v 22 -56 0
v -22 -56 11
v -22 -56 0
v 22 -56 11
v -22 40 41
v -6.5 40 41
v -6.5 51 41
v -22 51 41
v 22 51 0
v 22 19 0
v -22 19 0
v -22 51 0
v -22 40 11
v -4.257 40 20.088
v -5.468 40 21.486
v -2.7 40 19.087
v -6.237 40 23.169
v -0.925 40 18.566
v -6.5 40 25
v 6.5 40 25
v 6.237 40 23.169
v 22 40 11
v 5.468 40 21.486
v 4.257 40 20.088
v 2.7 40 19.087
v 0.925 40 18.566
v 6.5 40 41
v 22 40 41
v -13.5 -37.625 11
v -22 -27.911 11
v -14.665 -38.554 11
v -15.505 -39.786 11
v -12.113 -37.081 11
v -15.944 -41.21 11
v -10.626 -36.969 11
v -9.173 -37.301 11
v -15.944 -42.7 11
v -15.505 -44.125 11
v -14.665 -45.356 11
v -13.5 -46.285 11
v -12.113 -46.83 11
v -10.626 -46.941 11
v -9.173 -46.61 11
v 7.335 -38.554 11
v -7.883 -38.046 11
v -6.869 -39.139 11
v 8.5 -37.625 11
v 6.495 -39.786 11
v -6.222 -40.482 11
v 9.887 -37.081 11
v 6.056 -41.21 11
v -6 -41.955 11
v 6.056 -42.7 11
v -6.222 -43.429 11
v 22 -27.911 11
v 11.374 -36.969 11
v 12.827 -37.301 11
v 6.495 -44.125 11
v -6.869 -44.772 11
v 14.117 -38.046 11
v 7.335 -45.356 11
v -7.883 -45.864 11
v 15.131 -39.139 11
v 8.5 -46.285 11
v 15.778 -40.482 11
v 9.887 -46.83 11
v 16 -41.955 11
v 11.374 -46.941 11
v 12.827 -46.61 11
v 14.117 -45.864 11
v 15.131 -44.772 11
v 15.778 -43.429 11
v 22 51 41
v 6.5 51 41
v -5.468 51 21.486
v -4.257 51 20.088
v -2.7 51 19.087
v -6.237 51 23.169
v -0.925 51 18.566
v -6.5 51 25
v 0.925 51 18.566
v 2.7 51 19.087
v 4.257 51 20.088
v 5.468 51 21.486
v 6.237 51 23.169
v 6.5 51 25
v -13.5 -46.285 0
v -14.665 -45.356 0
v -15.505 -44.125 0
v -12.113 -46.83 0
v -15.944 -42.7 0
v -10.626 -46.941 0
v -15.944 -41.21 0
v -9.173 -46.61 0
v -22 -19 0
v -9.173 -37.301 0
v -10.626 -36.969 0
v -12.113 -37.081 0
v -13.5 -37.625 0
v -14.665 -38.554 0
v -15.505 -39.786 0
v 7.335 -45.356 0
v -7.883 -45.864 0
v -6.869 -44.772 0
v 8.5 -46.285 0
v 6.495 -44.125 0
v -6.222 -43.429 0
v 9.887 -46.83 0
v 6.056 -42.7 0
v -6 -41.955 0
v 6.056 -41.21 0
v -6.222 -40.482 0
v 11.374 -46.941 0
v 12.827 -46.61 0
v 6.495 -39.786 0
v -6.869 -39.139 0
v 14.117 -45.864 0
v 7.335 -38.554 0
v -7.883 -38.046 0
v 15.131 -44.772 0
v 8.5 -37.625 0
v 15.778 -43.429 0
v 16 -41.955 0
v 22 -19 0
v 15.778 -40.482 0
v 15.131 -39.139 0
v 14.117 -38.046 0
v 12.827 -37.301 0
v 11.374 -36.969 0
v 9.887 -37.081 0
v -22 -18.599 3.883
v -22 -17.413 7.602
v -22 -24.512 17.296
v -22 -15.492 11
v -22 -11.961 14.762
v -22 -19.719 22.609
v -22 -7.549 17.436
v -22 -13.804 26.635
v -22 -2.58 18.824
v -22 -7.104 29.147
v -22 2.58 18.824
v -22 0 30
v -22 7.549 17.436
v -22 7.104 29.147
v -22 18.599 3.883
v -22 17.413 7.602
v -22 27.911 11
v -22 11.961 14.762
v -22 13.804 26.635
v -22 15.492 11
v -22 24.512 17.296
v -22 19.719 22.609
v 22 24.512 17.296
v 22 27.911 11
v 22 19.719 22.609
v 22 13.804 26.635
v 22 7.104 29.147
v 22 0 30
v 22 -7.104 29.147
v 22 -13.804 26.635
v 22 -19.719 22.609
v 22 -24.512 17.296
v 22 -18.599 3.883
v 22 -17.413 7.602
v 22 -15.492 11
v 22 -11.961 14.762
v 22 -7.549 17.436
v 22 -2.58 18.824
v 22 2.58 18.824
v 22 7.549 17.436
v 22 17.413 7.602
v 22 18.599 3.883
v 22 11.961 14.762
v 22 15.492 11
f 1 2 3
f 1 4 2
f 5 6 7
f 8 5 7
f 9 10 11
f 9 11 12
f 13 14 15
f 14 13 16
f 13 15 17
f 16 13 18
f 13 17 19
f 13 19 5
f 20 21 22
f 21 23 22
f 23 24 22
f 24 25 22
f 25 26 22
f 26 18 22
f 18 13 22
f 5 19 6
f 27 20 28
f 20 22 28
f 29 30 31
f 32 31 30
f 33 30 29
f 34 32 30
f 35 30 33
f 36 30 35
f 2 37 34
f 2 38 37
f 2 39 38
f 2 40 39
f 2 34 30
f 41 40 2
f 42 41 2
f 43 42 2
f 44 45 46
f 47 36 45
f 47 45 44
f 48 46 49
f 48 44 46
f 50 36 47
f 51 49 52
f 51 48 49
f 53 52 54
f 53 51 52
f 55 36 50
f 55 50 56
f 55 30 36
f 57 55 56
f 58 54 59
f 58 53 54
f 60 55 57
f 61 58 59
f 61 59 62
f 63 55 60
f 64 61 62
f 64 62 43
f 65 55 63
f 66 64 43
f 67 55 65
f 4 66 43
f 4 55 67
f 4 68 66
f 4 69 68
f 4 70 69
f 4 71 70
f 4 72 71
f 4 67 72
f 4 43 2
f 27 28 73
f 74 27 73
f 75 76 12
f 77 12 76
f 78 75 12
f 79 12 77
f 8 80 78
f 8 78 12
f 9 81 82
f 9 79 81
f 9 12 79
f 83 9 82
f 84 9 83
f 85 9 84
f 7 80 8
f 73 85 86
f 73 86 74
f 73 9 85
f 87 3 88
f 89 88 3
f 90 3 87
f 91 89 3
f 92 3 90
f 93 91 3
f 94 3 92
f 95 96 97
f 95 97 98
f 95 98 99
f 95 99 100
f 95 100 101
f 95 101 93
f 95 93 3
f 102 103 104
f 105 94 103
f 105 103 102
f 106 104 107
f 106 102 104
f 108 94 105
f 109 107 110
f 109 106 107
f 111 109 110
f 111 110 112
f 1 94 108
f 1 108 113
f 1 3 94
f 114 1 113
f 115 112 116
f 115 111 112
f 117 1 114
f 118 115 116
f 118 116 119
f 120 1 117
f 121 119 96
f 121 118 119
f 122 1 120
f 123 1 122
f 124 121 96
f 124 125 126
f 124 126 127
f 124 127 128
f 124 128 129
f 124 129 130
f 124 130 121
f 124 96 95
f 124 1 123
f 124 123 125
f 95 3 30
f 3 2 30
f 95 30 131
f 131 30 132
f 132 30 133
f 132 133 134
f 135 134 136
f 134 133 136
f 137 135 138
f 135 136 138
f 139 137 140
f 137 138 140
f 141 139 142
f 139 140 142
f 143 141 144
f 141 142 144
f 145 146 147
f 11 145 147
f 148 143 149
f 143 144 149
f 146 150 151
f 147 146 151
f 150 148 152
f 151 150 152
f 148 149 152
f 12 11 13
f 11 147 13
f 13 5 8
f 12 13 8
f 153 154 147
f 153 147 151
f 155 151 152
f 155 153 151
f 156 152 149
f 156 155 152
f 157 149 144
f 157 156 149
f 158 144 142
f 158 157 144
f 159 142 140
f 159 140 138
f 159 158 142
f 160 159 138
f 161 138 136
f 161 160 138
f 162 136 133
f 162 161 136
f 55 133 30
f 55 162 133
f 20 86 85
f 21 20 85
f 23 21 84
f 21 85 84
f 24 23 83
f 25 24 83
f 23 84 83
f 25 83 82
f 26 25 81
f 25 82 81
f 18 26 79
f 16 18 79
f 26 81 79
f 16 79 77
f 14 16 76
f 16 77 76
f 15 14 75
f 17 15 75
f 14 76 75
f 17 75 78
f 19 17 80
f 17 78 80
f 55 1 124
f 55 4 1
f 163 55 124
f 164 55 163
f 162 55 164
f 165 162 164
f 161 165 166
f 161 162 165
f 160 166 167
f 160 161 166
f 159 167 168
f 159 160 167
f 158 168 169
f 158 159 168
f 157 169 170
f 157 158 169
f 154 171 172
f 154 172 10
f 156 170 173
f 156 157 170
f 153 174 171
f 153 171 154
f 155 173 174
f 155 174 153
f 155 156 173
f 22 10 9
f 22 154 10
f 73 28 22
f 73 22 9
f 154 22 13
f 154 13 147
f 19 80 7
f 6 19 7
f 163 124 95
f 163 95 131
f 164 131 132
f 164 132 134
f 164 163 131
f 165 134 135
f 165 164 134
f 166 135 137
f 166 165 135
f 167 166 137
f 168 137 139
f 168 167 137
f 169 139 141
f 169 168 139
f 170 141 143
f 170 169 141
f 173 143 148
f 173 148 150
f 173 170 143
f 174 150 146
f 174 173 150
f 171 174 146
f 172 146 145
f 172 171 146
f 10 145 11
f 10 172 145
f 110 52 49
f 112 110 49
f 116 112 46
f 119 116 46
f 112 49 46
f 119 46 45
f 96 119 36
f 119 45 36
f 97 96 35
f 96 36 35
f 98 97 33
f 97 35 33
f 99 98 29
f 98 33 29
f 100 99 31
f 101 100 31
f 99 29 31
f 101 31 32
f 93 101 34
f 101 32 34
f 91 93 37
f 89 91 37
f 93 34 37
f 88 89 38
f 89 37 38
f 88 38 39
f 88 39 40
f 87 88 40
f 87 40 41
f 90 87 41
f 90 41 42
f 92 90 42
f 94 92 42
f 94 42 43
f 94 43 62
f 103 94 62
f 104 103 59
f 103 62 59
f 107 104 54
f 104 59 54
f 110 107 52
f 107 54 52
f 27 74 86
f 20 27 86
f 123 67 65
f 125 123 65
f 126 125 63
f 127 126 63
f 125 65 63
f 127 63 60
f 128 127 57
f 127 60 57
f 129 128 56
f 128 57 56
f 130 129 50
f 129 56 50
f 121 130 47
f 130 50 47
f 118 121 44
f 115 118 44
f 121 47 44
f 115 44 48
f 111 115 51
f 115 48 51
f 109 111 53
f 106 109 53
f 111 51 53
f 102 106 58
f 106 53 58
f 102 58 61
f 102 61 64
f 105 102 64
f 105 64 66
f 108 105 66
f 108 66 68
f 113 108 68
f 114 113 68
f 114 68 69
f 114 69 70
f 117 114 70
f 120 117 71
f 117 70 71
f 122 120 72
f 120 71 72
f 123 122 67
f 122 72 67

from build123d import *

# Parameters (mm, degrees)
F0_W     = 11
F0_H     = 30
F1_DEPTH = 22
F3_DEPTH = 25
F4_R     = 5
F5_DEPTH = 11


with BuildPart() as f1:
    # F0 (on Right) → F1 (new body, symmetric)
    with BuildSketch(Plane.YZ):
        with BuildLine():
            Line((-56, 0), (-30, 0))
            ThreePointArc((-30, 0), (-29.4730143031, 5.5983415304), (-27.9105714739, 11))
            Line((-27.9105714739, 11), (-56, 11))
            Line((-56, 11), (-56, 0))
        make_face()
        with BuildLine():
            ThreePointArc((-27.9105714739, 11), (-29.4730143031, 5.5983415304), (-30, 0))
            Line((-30, 0), (-19, 0))
            ThreePointArc((-19, 0), (-18.1017503893, 5.7729223833), (-15.4919333848, 11))
            Line((-15.4919333848, 11), (-27.9105714739, 11))
        make_face()
        with BuildLine():
            Line((15.4919333848, 11), (27.9105714739, 11))
            ThreePointArc((27.9105714739, 11), (0, 30), (-27.9105714739, 11))
            Line((-27.9105714739, 11), (-15.4919333848, 11))
            ThreePointArc((-15.4919333848, 11), (0, 19), (15.4919333848, 11))
        make_face()
        with BuildLine():
            Line((19, 0), (30, 0))
            ThreePointArc((30, 0), (29.4730143031, 5.5983415304), (27.9105714739, 11))
            Line((27.9105714739, 11), (15.4919333848, 11))
            ThreePointArc((15.4919333848, 11), (18.1017503893, 5.7729223833), (19, 0))
        make_face()
        with BuildLine():
            ThreePointArc((27.9105714739, 11), (29.4730143031, 5.5983415304), (30, 0))
            Line((30, 0), (51, 0))
            Line((51, 0), (51, 11))
            Line((51, 11), (40, 11))
            Line((40, 11), (27.9105714739, 11))
        make_face()
        with Locations((45.5, 26)):
            Rectangle(F0_W, F0_H)
    extrude(amount=F1_DEPTH, both=True)

    # F2 (on face) → F3 (cut)
    with BuildSketch(Plane(origin=(0, 51, 0), x_dir=(-1, 0, 0), z_dir=(0, 1, 0))):
        with BuildLine():
            ThreePointArc((-6.5, 25), (0, 31.5), (6.5, 25))
            Line((6.5, 25), (6.5, 41))
            Line((6.5, 41), (-6.5, 41))
            Line((-6.5, 41), (-6.5, 25))
        make_face()
        with BuildLine():
            Line((-6.5, 25), (6.5, 25))
            ThreePointArc((6.5, 25), (0, 31.5), (-6.5, 25))
        make_face()
        with BuildLine():
            ThreePointArc((-6.5, 25), (0, 18.5), (6.5, 25))
            Line((6.5, 25), (-6.5, 25))
        make_face()
    extrude(amount=-F3_DEPTH, mode=Mode.SUBTRACT)

    # F4 (on face) → F5 (cut, through all)
    with BuildSketch(Plane.XY.offset(11)):
        with Locations((-11, -41.955285737)):
            Circle(F4_R)
        with Locations((11, -41.955285737)):
            Circle(F4_R)
    extrude(amount=-F5_DEPTH, mode=Mode.SUBTRACT)


solid = f1.part
